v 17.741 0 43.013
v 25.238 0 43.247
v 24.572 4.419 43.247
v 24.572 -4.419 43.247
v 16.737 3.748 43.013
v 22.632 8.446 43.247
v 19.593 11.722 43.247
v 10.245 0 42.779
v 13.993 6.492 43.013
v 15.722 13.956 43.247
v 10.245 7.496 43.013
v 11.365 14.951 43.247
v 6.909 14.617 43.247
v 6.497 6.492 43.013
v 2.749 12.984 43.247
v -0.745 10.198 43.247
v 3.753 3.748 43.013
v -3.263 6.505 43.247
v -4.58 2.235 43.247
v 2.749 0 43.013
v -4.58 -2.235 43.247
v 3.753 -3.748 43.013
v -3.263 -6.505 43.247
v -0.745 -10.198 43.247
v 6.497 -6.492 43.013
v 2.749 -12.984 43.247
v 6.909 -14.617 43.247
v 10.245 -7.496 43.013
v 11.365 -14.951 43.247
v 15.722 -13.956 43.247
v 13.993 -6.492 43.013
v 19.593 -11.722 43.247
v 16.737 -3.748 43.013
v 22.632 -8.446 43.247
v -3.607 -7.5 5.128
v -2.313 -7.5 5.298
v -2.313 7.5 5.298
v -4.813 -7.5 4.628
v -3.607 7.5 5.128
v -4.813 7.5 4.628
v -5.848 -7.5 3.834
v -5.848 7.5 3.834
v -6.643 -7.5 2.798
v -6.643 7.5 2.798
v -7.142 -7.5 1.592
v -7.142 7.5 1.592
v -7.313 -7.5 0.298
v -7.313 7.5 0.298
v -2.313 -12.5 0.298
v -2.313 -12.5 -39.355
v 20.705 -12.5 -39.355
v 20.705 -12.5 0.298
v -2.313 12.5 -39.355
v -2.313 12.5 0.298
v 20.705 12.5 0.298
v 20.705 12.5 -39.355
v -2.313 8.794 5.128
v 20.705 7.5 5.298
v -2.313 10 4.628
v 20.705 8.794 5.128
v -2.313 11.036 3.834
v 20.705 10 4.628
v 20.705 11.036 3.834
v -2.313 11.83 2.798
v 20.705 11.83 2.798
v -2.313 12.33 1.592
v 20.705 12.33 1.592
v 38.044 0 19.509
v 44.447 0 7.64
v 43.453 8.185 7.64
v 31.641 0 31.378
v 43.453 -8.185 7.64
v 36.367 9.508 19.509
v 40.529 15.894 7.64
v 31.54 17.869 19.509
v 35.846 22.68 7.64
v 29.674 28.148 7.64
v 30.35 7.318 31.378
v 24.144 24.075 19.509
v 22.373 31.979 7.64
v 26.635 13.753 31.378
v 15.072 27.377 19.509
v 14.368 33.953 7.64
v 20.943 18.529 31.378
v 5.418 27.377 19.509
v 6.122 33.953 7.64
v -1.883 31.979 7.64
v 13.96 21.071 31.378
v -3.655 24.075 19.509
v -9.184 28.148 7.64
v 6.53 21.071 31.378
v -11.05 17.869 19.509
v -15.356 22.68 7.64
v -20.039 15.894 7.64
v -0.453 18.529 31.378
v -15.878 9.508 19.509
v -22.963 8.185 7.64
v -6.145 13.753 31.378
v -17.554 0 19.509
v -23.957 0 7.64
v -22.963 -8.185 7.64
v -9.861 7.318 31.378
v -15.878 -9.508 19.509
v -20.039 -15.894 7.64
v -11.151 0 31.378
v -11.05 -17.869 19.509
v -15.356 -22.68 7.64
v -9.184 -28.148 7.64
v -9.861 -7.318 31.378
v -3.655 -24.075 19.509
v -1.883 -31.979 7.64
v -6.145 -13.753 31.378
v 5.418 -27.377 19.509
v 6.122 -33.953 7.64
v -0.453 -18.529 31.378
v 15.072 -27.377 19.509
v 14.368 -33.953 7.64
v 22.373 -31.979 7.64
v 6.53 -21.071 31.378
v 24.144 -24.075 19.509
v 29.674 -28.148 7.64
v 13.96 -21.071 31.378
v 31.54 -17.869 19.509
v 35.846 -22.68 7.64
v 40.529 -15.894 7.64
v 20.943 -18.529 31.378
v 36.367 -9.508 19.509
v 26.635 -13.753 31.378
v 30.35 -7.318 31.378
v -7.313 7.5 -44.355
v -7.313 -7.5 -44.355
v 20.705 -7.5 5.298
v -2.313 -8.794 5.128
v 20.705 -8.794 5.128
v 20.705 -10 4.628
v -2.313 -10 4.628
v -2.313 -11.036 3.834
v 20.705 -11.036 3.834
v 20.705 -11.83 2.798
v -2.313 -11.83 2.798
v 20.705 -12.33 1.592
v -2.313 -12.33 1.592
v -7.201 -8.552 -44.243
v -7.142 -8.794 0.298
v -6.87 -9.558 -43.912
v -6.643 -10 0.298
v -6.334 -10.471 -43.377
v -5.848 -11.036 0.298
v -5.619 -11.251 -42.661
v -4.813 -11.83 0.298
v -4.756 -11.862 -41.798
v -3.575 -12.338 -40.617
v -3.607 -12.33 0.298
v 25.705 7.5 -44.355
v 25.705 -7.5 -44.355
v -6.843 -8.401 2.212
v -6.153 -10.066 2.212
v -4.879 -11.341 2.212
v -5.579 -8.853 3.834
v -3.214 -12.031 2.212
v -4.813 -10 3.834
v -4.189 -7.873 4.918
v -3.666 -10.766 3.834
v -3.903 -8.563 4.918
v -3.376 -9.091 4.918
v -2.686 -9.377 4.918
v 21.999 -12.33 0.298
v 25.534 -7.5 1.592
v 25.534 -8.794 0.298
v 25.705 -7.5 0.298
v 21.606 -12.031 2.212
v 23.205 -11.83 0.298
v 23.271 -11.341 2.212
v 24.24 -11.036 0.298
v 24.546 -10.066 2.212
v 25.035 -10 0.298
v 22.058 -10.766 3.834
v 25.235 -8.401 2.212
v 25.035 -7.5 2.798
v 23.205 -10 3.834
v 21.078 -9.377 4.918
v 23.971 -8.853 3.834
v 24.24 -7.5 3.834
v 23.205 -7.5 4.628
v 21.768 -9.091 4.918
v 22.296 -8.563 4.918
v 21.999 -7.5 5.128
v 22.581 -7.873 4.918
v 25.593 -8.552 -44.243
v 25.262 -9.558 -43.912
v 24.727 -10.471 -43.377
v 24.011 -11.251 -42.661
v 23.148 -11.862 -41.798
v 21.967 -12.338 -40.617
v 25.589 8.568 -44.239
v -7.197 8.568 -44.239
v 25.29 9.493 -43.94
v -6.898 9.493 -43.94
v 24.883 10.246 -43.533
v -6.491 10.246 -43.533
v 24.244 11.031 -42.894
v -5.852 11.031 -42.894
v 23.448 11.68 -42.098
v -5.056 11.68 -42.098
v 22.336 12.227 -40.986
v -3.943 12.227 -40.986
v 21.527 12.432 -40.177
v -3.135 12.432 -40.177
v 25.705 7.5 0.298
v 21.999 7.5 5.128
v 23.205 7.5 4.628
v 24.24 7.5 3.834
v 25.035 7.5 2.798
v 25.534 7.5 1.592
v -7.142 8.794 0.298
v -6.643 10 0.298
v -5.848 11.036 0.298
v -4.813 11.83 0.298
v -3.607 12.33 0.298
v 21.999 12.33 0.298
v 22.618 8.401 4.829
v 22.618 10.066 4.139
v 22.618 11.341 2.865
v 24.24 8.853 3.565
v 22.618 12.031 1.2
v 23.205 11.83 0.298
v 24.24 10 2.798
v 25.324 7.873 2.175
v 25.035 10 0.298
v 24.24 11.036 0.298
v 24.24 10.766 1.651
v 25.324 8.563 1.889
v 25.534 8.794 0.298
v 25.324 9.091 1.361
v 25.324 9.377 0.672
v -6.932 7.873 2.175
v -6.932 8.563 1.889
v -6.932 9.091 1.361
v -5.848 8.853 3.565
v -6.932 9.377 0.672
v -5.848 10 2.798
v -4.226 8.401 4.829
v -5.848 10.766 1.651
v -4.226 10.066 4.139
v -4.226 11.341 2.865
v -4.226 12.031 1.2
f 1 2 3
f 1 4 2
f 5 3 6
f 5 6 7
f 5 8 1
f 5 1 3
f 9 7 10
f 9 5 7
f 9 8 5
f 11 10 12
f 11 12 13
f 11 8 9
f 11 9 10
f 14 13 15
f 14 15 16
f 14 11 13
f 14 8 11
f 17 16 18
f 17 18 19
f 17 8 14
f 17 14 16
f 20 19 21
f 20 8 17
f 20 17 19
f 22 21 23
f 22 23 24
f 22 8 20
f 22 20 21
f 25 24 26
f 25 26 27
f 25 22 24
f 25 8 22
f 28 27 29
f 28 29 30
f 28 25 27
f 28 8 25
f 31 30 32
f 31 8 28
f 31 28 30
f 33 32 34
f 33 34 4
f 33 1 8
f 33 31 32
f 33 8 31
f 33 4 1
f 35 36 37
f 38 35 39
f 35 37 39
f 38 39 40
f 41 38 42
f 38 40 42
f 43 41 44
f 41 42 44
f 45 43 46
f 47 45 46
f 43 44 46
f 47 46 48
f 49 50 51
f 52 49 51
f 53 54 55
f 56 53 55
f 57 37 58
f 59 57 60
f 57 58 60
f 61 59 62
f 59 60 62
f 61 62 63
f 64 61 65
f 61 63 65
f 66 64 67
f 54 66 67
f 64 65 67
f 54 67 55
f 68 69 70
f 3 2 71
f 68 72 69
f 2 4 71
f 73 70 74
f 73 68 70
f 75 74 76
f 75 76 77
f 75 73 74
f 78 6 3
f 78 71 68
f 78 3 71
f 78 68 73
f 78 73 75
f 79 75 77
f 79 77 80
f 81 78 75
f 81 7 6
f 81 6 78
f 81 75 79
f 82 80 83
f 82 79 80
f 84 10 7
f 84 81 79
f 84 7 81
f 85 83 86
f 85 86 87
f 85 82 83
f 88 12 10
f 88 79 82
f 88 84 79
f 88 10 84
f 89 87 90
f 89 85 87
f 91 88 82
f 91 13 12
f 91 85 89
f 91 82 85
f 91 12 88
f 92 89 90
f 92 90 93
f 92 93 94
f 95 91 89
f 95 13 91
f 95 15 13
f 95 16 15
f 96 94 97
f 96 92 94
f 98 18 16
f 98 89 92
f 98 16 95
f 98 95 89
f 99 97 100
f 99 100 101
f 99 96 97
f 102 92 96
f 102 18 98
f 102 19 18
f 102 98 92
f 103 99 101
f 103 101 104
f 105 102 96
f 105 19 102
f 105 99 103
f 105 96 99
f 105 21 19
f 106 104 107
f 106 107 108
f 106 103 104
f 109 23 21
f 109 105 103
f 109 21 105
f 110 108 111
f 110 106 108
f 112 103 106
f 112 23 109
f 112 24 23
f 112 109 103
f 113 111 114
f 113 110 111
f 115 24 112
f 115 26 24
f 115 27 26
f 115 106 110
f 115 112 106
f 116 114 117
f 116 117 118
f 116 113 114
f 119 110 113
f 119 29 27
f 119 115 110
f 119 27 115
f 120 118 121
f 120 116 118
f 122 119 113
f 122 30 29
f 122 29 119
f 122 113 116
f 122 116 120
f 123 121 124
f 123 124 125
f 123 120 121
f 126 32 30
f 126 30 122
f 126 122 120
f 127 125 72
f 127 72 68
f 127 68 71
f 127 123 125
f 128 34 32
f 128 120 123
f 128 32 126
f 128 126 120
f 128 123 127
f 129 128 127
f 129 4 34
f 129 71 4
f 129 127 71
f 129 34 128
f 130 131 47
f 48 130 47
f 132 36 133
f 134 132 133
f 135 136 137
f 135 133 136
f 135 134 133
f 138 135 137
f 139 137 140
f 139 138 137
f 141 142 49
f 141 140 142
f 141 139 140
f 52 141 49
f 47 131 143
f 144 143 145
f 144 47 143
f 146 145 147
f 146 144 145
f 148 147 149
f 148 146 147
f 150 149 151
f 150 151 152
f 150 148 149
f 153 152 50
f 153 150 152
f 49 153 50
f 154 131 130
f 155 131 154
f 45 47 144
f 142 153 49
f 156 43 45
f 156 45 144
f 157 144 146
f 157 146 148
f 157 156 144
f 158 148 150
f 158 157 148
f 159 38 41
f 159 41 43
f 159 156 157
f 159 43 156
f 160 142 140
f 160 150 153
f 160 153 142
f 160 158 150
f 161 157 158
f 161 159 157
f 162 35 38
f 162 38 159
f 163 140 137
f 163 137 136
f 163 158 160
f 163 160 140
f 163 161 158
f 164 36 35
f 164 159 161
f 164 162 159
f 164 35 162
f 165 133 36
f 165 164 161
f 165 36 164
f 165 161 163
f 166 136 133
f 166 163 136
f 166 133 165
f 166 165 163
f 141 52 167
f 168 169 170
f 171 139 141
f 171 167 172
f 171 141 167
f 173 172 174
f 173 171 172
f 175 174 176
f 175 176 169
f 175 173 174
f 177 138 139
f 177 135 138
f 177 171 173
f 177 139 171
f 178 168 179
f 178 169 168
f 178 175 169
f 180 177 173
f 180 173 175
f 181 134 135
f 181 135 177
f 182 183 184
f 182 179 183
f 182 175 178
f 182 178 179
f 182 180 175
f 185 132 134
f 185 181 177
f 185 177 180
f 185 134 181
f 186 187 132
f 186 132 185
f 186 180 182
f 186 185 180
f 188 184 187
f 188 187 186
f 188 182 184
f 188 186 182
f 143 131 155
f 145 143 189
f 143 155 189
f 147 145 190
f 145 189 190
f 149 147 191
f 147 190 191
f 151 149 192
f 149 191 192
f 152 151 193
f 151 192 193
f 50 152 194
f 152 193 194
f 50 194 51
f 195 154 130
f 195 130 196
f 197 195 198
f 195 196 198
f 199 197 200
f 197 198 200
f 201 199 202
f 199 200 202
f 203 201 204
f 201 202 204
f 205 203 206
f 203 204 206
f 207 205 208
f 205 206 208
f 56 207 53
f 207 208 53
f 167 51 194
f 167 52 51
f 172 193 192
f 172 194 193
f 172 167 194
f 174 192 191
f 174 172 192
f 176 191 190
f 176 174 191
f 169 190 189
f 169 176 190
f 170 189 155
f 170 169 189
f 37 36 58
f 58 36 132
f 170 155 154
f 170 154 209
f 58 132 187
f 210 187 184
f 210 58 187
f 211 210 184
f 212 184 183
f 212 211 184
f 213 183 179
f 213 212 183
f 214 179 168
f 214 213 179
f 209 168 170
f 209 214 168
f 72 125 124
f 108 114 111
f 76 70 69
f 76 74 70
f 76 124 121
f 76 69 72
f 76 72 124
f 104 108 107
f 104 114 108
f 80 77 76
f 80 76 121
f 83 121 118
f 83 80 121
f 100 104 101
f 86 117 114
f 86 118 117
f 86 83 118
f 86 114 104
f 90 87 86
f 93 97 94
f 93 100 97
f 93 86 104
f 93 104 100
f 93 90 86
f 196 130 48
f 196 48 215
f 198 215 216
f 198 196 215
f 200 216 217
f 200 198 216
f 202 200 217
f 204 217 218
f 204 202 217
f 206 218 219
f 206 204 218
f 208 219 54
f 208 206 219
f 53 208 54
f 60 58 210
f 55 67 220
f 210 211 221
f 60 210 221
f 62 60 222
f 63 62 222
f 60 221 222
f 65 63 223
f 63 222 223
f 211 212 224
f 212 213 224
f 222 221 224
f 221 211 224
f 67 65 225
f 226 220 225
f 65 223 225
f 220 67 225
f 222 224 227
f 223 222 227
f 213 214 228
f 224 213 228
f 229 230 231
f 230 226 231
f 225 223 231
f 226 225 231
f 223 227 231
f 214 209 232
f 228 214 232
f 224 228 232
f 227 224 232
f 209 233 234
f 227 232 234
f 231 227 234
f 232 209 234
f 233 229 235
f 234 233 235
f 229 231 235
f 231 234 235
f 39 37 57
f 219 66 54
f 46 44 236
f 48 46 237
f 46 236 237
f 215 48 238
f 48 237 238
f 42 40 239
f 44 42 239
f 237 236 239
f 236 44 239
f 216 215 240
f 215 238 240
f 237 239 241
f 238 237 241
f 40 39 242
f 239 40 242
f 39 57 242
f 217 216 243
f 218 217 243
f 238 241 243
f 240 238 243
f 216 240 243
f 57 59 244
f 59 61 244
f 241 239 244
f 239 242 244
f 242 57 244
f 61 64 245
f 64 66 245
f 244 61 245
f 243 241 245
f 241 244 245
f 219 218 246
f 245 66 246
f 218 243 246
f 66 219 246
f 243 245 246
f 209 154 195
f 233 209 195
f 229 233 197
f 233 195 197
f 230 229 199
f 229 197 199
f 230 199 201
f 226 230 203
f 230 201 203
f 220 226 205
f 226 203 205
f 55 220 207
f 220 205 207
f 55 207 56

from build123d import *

# Parameters (mm, degrees)
F2_W         = 33.0171785317
F2_H         = 49.6530286036
F3_DEPTH     = 12.5
F4_R         = 5
F5_R         = 5
F6_T1_DEPTH  = 57.1530286036
F6_T3_DEPTH  = 58.0171785317
F6_T5_DEPTH  = 15
F6_S9_W      = 5
F6_S9_H      = 5
F6_T10_DEPTH = 5
F6_S15_W     = 5
F6_S15_H     = 5
F6_T16_DEPTH = 5
F6_T20_ANGLE = 90
F6_T22_ANGLE = 90


# Not quite as in the source:
# - a fillet or chamfer that OpenCascade refuses, or shapes differently, is made with other operations: its cross-section is extruded or revolved along the edge and cut away or added


with BuildPart() as f1:
    # F0 (on Front) → F1 (revolve)
    with BuildSketch(Plane.XZ):
        Polygon((10.2449354299, 42.7789126646), (10.2449354299, 7.6398269811), (44.4469846271, 7.6398269811), (25.2376164656, 43.2474373302), align=None)
    revolve(axis=Axis((10.2449354299, 0, 25.2093698228), (0, 0, 1)))


with BuildPart() as f3:
    # F2 (on Front) → F3 (new body, symmetric)
    with BuildSketch(Plane.XZ):
        with Locations((9.1960497666, -19.5281591732)):
            Rectangle(F2_W, F2_H)
    extrude(amount=F3_DEPTH, both=True)

    # F4
    f4_edges = [f3.edges().sort_by_distance(p)[0] for p in [
        (9.19605, 12.5, 5.298355),
    ]]
    fillet(f4_edges, radius=F4_R)

    # F5
    f5_edges = [f3.edges().sort_by_distance(p)[0] for p in [
        (9.19605, -12.5, 5.298355),
        (-7.312539, -12.5, -19.528159),
        (9.19605, -12.5, -44.354673),
        (25.704639, -12.5, -19.528159),
    ]]
    fillet(f5_edges, radius=F5_R)

    # F6: fillet of radius 5 on 4 edges, made by hand

    # F6_s2 → F6_t1 (cut)
    with BuildSketch(Plane.XY.offset(-56.854673475)):
        with BuildLine():
            ThreePointArc((-7.3125394993, 7.5), (-5.8480734052, 11.0355339059), (-2.3125394993, 12.5))
            Line((-2.3125394993, 12.5), (-7.3125394993, 12.5))
            Line((-7.3125394993, 12.5), (-7.3125394993, 7.5))
        make_face()
        with BuildLine():
            ThreePointArc((25.7046390325, 7.5), (24.2401729384, 11.0355339059), (20.7046390325, 12.5))
            Line((20.7046390325, 12.5), (25.7046390325, 12.5))
            Line((25.7046390325, 12.5), (25.7046390325, 7.5))
        make_face()
    extrude(amount=F6_T1_DEPTH, mode=Mode.SUBTRACT)

    # F6_s4 → F6_t3 (cut)
    with BuildSketch(Plane.YZ.offset(-19.8125394993)):
        with BuildLine():
            ThreePointArc((7.5, -44.354673475), (11.0355339059, -42.890207381), (12.5, -39.354673475))
            Line((12.5, -39.354673475), (12.5, -44.354673475))
            Line((12.5, -44.354673475), (7.5, -44.354673475))
        make_face()
    extrude(amount=F6_T3_DEPTH, mode=Mode.SUBTRACT)

    # F6_s6 → F6_t5 (cut)
    with BuildSketch(Plane.XZ.offset(-7.5)):
        with BuildLine():
            ThreePointArc((20.7046390325, 5.2983551286), (24.2401729384, 3.8338890345), (25.7046390325, 0.2983551286))
            Line((25.7046390325, 0.2983551286), (25.7046390325, 5.2983551286))
            Line((25.7046390325, 5.2983551286), (20.7046390325, 5.2983551286))
        make_face()
        with BuildLine():
            ThreePointArc((-2.3125394993, 5.2983551286), (-5.8480734052, 3.8338890345), (-7.3125394993, 0.2983551286))
            Line((-7.3125394993, 0.2983551286), (-7.3125394993, 5.2983551286))
            Line((-7.3125394993, 5.2983551286), (-2.3125394993, 5.2983551286))
        make_face()
    extrude(amount=F6_T5_DEPTH, mode=Mode.SUBTRACT)


with BuildPart() as f6_tool8:
    # F6_s9 → F6_t10 (new body)
    with BuildSketch(Plane.XY.offset(0.2983551286)):
        with Locations((23.2046390325, -10)):
            Rectangle(F6_S9_W, F6_S9_H)
    extrude(amount=F6_T10_DEPTH)

    # F6_s11 → F6_t12 (revolve, cut)
    with BuildSketch(Plane(origin=(20.7046390325, -7.5, 0.2983551286), x_dir=(-0.7071067812, 0.7071067812, 0), z_dir=(0.7071067812, 0.7071067812, 0))):
        with BuildLine():
            ThreePointArc((0, -5), (5, 0), (0, 5))
            Line((0, 5), (0, -5))
        make_face()
    revolve(axis=Axis((20.7046390325, -7.5, 0.2983551286), (0, 0, 1)), mode=Mode.SUBTRACT)


with BuildPart() as f3_1:
    add(f3.part)

    # F6_t7: cut F6_tool8
    add(f6_tool8.part, mode=Mode.SUBTRACT)


with BuildPart() as f6_tool14:
    # F6_s15 → F6_t16 (new body)
    with BuildSketch(Plane.XY.offset(0.2983551286)):
        with Locations((-4.8125394993, -10)):
            Rectangle(F6_S15_W, F6_S15_H)
    extrude(amount=F6_T16_DEPTH)

    # F6_s17 → F6_t18 (revolve, cut)
    with BuildSketch(Plane(origin=(-2.3125394993, -7.5, 0.2983551286), x_dir=(0.7071067812, 0.7071067812, 0), z_dir=(0.7071067812, -0.7071067812, 0))):
        with BuildLine():
            ThreePointArc((0, -5), (5, 0), (0, 5))
            Line((0, 5), (0, -5))
        make_face()
    revolve(axis=Axis((-2.3125394993, -7.5, 0.2983551286), (0, 0, 1)), mode=Mode.SUBTRACT)


with BuildPart() as f3_2:
    add(f3_1.part)

    # F6_t13: cut F6_tool14
    add(f6_tool14.part, mode=Mode.SUBTRACT)

    # F6_s19 → F6_t20 (revolve, cut)
    with BuildSketch(Plane.XZ.offset(-7.5)):
        with BuildLine():
            ThreePointArc((20.7046390325, 5.2983551286), (24.2401729384, 3.8338890345), (25.7046390325, 0.2983551286))
            Line((25.7046390325, 0.2983551286), (25.7046390325, 5.2983551286))
            Line((25.7046390325, 5.2983551286), (20.7046390325, 5.2983551286))
        make_face()
    revolve(axis=Axis((25.7046390325, 7.5, 0.2983551286), (-1, 0, 0)), revolution_arc=F6_T20_ANGLE, mode=Mode.SUBTRACT)

    # F6_s21 → F6_t22 (revolve, cut)
    with BuildSketch(Plane.XZ.offset(-7.5)):
        with BuildLine():
            ThreePointArc((-7.3125394993, 0.2983551286), (-5.8480734052, 3.8338890345), (-2.3125394993, 5.2983551286))
            Line((-2.3125394993, 5.2983551286), (-7.3125394993, 5.2983551286))
            Line((-7.3125394993, 5.2983551286), (-7.3125394993, 0.2983551286))
        make_face()
    revolve(axis=Axis((-7.3125394993, 7.5, 0.2983551286), (-1, 0, 0)), revolution_arc=F6_T22_ANGLE, mode=Mode.SUBTRACT)


solid = Compound([f1.part, f3_2.part])
